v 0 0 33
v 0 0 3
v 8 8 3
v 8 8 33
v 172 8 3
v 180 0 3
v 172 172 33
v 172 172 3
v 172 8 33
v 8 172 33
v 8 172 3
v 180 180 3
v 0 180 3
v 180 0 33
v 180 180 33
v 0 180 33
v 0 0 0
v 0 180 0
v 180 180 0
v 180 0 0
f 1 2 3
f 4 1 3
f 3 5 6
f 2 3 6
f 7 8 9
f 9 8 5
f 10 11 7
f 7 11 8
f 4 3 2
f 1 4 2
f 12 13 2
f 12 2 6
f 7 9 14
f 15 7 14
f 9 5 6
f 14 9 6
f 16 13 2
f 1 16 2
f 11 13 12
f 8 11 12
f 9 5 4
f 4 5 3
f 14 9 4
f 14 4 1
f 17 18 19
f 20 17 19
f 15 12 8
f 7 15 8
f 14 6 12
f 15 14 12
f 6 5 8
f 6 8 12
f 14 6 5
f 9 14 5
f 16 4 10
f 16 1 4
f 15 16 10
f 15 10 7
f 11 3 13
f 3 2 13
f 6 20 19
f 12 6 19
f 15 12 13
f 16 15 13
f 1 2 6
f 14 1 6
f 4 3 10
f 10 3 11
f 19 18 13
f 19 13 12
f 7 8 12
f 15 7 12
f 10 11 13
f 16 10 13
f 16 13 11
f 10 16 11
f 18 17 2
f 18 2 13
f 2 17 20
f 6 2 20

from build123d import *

# Parameters (mm, degrees)
F0_W     = 180
F0_H     = 180
F1_DEPTH = 3
F3_DEPTH = 30
F4_DEPTH = 30
F5_DEPTH = 30
F6_DEPTH = 30


# Not quite as in the source:
# - an extrude ends at something that could not be found from the text; its depth is read off the source's solid


with BuildPart() as f1:
    # F0 (on Top) → F1 (new body)
    with BuildSketch(Plane.XY):
        with Locations((90, 90)):
            Rectangle(F0_W, F0_H)
    extrude(amount=F1_DEPTH)


with BuildPart() as f3:
    # F2 (on face) → F3 (new body)
    with BuildSketch(Plane.XY.offset(3)):
        Polygon((0, 180), (8, 172), (172, 172), (180, 180), align=None)
    extrude(amount=F3_DEPTH)


with BuildPart() as f4:
    # F2 (on face) → F4 (new body, through all)
    with BuildSketch(Plane.XY.offset(3)):
        Polygon((180, 180), (172, 172), (172, 8), (180, 0), align=None)
    extrude(amount=F4_DEPTH)


with BuildPart() as f5:
    # F2 (on face) → F5 (new body, through all)
    with BuildSketch(Plane.XY.offset(3)):
        Polygon((172, 8), (8, 8), (0, 0), (180, 0), align=None)
    extrude(amount=F5_DEPTH)


with BuildPart() as f6:
    # F2 (on face) → F6 (new body, through all)
    with BuildSketch(Plane.XY.offset(3)):
        Polygon((8, 8), (8, 172), (0, 180), (0, 0), align=None)
    extrude(amount=F6_DEPTH)


solid = Compound([f1.part, f3.part, f4.part, f5.part, f6.part])
